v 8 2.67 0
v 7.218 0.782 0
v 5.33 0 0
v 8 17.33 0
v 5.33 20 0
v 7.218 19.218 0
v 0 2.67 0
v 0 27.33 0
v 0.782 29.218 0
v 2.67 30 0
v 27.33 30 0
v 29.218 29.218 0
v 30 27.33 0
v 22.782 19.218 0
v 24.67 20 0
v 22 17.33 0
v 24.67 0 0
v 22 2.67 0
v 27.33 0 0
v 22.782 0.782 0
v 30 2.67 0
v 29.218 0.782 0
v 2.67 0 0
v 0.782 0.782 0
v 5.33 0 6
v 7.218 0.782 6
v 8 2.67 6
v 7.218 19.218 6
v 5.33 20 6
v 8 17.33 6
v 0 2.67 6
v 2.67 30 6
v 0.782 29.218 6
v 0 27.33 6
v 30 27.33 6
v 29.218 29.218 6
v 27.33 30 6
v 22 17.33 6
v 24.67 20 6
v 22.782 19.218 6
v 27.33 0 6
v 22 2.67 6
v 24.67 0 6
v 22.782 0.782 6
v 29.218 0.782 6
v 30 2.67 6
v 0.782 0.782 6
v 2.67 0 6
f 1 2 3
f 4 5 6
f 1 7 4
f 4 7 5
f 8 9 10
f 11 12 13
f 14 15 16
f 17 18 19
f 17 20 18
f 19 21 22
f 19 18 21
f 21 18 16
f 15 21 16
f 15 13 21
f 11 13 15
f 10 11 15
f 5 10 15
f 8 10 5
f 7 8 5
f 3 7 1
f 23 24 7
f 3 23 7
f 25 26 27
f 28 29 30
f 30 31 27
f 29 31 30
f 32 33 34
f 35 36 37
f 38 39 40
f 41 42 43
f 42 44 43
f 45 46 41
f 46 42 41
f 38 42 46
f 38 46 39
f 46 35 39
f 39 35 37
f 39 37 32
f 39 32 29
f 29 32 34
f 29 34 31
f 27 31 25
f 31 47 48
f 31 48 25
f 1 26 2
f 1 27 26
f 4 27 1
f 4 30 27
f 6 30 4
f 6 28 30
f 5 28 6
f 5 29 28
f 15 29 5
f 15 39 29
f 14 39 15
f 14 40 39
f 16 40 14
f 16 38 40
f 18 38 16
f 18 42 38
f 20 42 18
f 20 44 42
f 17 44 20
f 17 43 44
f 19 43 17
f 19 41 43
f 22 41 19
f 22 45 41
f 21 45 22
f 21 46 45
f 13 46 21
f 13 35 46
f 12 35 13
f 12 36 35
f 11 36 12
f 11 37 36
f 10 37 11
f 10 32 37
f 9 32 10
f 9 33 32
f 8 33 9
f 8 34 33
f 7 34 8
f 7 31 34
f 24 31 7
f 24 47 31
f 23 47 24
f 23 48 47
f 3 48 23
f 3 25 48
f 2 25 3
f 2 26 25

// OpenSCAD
$fn = 32;

// ----------------------------------------------------------------------
// Clip blank: staple clip, 6 mm thick
// ----------------------------------------------------------------------

// --- parameters (mm) ---
profile_height = 6;       // extrusion height
profile_points = 24;      // points of the closed outline

profile = [[0, 2.67], [0.782, 0.782], [2.67, 0], [5.33, 0], [7.218, 0.782], [8, 2.67], [8, 17.33], [7.218, 19.218], [5.33, 20], [24.67, 20], [22.782, 19.218], [22, 17.33], [22, 2.67], [22.782, 0.782], [24.67, 0], [27.33, 0], [29.218, 0.782], [30, 2.67], [30, 27.33], [29.218, 29.218], [27.33, 30], [2.67, 30], [0.782, 29.218], [0, 27.33]];  // single closed polygon, 24 points, counter clockwise

// --- the one profile operation ---
linear_extrude(height = profile_height) polygon(points = profile);
